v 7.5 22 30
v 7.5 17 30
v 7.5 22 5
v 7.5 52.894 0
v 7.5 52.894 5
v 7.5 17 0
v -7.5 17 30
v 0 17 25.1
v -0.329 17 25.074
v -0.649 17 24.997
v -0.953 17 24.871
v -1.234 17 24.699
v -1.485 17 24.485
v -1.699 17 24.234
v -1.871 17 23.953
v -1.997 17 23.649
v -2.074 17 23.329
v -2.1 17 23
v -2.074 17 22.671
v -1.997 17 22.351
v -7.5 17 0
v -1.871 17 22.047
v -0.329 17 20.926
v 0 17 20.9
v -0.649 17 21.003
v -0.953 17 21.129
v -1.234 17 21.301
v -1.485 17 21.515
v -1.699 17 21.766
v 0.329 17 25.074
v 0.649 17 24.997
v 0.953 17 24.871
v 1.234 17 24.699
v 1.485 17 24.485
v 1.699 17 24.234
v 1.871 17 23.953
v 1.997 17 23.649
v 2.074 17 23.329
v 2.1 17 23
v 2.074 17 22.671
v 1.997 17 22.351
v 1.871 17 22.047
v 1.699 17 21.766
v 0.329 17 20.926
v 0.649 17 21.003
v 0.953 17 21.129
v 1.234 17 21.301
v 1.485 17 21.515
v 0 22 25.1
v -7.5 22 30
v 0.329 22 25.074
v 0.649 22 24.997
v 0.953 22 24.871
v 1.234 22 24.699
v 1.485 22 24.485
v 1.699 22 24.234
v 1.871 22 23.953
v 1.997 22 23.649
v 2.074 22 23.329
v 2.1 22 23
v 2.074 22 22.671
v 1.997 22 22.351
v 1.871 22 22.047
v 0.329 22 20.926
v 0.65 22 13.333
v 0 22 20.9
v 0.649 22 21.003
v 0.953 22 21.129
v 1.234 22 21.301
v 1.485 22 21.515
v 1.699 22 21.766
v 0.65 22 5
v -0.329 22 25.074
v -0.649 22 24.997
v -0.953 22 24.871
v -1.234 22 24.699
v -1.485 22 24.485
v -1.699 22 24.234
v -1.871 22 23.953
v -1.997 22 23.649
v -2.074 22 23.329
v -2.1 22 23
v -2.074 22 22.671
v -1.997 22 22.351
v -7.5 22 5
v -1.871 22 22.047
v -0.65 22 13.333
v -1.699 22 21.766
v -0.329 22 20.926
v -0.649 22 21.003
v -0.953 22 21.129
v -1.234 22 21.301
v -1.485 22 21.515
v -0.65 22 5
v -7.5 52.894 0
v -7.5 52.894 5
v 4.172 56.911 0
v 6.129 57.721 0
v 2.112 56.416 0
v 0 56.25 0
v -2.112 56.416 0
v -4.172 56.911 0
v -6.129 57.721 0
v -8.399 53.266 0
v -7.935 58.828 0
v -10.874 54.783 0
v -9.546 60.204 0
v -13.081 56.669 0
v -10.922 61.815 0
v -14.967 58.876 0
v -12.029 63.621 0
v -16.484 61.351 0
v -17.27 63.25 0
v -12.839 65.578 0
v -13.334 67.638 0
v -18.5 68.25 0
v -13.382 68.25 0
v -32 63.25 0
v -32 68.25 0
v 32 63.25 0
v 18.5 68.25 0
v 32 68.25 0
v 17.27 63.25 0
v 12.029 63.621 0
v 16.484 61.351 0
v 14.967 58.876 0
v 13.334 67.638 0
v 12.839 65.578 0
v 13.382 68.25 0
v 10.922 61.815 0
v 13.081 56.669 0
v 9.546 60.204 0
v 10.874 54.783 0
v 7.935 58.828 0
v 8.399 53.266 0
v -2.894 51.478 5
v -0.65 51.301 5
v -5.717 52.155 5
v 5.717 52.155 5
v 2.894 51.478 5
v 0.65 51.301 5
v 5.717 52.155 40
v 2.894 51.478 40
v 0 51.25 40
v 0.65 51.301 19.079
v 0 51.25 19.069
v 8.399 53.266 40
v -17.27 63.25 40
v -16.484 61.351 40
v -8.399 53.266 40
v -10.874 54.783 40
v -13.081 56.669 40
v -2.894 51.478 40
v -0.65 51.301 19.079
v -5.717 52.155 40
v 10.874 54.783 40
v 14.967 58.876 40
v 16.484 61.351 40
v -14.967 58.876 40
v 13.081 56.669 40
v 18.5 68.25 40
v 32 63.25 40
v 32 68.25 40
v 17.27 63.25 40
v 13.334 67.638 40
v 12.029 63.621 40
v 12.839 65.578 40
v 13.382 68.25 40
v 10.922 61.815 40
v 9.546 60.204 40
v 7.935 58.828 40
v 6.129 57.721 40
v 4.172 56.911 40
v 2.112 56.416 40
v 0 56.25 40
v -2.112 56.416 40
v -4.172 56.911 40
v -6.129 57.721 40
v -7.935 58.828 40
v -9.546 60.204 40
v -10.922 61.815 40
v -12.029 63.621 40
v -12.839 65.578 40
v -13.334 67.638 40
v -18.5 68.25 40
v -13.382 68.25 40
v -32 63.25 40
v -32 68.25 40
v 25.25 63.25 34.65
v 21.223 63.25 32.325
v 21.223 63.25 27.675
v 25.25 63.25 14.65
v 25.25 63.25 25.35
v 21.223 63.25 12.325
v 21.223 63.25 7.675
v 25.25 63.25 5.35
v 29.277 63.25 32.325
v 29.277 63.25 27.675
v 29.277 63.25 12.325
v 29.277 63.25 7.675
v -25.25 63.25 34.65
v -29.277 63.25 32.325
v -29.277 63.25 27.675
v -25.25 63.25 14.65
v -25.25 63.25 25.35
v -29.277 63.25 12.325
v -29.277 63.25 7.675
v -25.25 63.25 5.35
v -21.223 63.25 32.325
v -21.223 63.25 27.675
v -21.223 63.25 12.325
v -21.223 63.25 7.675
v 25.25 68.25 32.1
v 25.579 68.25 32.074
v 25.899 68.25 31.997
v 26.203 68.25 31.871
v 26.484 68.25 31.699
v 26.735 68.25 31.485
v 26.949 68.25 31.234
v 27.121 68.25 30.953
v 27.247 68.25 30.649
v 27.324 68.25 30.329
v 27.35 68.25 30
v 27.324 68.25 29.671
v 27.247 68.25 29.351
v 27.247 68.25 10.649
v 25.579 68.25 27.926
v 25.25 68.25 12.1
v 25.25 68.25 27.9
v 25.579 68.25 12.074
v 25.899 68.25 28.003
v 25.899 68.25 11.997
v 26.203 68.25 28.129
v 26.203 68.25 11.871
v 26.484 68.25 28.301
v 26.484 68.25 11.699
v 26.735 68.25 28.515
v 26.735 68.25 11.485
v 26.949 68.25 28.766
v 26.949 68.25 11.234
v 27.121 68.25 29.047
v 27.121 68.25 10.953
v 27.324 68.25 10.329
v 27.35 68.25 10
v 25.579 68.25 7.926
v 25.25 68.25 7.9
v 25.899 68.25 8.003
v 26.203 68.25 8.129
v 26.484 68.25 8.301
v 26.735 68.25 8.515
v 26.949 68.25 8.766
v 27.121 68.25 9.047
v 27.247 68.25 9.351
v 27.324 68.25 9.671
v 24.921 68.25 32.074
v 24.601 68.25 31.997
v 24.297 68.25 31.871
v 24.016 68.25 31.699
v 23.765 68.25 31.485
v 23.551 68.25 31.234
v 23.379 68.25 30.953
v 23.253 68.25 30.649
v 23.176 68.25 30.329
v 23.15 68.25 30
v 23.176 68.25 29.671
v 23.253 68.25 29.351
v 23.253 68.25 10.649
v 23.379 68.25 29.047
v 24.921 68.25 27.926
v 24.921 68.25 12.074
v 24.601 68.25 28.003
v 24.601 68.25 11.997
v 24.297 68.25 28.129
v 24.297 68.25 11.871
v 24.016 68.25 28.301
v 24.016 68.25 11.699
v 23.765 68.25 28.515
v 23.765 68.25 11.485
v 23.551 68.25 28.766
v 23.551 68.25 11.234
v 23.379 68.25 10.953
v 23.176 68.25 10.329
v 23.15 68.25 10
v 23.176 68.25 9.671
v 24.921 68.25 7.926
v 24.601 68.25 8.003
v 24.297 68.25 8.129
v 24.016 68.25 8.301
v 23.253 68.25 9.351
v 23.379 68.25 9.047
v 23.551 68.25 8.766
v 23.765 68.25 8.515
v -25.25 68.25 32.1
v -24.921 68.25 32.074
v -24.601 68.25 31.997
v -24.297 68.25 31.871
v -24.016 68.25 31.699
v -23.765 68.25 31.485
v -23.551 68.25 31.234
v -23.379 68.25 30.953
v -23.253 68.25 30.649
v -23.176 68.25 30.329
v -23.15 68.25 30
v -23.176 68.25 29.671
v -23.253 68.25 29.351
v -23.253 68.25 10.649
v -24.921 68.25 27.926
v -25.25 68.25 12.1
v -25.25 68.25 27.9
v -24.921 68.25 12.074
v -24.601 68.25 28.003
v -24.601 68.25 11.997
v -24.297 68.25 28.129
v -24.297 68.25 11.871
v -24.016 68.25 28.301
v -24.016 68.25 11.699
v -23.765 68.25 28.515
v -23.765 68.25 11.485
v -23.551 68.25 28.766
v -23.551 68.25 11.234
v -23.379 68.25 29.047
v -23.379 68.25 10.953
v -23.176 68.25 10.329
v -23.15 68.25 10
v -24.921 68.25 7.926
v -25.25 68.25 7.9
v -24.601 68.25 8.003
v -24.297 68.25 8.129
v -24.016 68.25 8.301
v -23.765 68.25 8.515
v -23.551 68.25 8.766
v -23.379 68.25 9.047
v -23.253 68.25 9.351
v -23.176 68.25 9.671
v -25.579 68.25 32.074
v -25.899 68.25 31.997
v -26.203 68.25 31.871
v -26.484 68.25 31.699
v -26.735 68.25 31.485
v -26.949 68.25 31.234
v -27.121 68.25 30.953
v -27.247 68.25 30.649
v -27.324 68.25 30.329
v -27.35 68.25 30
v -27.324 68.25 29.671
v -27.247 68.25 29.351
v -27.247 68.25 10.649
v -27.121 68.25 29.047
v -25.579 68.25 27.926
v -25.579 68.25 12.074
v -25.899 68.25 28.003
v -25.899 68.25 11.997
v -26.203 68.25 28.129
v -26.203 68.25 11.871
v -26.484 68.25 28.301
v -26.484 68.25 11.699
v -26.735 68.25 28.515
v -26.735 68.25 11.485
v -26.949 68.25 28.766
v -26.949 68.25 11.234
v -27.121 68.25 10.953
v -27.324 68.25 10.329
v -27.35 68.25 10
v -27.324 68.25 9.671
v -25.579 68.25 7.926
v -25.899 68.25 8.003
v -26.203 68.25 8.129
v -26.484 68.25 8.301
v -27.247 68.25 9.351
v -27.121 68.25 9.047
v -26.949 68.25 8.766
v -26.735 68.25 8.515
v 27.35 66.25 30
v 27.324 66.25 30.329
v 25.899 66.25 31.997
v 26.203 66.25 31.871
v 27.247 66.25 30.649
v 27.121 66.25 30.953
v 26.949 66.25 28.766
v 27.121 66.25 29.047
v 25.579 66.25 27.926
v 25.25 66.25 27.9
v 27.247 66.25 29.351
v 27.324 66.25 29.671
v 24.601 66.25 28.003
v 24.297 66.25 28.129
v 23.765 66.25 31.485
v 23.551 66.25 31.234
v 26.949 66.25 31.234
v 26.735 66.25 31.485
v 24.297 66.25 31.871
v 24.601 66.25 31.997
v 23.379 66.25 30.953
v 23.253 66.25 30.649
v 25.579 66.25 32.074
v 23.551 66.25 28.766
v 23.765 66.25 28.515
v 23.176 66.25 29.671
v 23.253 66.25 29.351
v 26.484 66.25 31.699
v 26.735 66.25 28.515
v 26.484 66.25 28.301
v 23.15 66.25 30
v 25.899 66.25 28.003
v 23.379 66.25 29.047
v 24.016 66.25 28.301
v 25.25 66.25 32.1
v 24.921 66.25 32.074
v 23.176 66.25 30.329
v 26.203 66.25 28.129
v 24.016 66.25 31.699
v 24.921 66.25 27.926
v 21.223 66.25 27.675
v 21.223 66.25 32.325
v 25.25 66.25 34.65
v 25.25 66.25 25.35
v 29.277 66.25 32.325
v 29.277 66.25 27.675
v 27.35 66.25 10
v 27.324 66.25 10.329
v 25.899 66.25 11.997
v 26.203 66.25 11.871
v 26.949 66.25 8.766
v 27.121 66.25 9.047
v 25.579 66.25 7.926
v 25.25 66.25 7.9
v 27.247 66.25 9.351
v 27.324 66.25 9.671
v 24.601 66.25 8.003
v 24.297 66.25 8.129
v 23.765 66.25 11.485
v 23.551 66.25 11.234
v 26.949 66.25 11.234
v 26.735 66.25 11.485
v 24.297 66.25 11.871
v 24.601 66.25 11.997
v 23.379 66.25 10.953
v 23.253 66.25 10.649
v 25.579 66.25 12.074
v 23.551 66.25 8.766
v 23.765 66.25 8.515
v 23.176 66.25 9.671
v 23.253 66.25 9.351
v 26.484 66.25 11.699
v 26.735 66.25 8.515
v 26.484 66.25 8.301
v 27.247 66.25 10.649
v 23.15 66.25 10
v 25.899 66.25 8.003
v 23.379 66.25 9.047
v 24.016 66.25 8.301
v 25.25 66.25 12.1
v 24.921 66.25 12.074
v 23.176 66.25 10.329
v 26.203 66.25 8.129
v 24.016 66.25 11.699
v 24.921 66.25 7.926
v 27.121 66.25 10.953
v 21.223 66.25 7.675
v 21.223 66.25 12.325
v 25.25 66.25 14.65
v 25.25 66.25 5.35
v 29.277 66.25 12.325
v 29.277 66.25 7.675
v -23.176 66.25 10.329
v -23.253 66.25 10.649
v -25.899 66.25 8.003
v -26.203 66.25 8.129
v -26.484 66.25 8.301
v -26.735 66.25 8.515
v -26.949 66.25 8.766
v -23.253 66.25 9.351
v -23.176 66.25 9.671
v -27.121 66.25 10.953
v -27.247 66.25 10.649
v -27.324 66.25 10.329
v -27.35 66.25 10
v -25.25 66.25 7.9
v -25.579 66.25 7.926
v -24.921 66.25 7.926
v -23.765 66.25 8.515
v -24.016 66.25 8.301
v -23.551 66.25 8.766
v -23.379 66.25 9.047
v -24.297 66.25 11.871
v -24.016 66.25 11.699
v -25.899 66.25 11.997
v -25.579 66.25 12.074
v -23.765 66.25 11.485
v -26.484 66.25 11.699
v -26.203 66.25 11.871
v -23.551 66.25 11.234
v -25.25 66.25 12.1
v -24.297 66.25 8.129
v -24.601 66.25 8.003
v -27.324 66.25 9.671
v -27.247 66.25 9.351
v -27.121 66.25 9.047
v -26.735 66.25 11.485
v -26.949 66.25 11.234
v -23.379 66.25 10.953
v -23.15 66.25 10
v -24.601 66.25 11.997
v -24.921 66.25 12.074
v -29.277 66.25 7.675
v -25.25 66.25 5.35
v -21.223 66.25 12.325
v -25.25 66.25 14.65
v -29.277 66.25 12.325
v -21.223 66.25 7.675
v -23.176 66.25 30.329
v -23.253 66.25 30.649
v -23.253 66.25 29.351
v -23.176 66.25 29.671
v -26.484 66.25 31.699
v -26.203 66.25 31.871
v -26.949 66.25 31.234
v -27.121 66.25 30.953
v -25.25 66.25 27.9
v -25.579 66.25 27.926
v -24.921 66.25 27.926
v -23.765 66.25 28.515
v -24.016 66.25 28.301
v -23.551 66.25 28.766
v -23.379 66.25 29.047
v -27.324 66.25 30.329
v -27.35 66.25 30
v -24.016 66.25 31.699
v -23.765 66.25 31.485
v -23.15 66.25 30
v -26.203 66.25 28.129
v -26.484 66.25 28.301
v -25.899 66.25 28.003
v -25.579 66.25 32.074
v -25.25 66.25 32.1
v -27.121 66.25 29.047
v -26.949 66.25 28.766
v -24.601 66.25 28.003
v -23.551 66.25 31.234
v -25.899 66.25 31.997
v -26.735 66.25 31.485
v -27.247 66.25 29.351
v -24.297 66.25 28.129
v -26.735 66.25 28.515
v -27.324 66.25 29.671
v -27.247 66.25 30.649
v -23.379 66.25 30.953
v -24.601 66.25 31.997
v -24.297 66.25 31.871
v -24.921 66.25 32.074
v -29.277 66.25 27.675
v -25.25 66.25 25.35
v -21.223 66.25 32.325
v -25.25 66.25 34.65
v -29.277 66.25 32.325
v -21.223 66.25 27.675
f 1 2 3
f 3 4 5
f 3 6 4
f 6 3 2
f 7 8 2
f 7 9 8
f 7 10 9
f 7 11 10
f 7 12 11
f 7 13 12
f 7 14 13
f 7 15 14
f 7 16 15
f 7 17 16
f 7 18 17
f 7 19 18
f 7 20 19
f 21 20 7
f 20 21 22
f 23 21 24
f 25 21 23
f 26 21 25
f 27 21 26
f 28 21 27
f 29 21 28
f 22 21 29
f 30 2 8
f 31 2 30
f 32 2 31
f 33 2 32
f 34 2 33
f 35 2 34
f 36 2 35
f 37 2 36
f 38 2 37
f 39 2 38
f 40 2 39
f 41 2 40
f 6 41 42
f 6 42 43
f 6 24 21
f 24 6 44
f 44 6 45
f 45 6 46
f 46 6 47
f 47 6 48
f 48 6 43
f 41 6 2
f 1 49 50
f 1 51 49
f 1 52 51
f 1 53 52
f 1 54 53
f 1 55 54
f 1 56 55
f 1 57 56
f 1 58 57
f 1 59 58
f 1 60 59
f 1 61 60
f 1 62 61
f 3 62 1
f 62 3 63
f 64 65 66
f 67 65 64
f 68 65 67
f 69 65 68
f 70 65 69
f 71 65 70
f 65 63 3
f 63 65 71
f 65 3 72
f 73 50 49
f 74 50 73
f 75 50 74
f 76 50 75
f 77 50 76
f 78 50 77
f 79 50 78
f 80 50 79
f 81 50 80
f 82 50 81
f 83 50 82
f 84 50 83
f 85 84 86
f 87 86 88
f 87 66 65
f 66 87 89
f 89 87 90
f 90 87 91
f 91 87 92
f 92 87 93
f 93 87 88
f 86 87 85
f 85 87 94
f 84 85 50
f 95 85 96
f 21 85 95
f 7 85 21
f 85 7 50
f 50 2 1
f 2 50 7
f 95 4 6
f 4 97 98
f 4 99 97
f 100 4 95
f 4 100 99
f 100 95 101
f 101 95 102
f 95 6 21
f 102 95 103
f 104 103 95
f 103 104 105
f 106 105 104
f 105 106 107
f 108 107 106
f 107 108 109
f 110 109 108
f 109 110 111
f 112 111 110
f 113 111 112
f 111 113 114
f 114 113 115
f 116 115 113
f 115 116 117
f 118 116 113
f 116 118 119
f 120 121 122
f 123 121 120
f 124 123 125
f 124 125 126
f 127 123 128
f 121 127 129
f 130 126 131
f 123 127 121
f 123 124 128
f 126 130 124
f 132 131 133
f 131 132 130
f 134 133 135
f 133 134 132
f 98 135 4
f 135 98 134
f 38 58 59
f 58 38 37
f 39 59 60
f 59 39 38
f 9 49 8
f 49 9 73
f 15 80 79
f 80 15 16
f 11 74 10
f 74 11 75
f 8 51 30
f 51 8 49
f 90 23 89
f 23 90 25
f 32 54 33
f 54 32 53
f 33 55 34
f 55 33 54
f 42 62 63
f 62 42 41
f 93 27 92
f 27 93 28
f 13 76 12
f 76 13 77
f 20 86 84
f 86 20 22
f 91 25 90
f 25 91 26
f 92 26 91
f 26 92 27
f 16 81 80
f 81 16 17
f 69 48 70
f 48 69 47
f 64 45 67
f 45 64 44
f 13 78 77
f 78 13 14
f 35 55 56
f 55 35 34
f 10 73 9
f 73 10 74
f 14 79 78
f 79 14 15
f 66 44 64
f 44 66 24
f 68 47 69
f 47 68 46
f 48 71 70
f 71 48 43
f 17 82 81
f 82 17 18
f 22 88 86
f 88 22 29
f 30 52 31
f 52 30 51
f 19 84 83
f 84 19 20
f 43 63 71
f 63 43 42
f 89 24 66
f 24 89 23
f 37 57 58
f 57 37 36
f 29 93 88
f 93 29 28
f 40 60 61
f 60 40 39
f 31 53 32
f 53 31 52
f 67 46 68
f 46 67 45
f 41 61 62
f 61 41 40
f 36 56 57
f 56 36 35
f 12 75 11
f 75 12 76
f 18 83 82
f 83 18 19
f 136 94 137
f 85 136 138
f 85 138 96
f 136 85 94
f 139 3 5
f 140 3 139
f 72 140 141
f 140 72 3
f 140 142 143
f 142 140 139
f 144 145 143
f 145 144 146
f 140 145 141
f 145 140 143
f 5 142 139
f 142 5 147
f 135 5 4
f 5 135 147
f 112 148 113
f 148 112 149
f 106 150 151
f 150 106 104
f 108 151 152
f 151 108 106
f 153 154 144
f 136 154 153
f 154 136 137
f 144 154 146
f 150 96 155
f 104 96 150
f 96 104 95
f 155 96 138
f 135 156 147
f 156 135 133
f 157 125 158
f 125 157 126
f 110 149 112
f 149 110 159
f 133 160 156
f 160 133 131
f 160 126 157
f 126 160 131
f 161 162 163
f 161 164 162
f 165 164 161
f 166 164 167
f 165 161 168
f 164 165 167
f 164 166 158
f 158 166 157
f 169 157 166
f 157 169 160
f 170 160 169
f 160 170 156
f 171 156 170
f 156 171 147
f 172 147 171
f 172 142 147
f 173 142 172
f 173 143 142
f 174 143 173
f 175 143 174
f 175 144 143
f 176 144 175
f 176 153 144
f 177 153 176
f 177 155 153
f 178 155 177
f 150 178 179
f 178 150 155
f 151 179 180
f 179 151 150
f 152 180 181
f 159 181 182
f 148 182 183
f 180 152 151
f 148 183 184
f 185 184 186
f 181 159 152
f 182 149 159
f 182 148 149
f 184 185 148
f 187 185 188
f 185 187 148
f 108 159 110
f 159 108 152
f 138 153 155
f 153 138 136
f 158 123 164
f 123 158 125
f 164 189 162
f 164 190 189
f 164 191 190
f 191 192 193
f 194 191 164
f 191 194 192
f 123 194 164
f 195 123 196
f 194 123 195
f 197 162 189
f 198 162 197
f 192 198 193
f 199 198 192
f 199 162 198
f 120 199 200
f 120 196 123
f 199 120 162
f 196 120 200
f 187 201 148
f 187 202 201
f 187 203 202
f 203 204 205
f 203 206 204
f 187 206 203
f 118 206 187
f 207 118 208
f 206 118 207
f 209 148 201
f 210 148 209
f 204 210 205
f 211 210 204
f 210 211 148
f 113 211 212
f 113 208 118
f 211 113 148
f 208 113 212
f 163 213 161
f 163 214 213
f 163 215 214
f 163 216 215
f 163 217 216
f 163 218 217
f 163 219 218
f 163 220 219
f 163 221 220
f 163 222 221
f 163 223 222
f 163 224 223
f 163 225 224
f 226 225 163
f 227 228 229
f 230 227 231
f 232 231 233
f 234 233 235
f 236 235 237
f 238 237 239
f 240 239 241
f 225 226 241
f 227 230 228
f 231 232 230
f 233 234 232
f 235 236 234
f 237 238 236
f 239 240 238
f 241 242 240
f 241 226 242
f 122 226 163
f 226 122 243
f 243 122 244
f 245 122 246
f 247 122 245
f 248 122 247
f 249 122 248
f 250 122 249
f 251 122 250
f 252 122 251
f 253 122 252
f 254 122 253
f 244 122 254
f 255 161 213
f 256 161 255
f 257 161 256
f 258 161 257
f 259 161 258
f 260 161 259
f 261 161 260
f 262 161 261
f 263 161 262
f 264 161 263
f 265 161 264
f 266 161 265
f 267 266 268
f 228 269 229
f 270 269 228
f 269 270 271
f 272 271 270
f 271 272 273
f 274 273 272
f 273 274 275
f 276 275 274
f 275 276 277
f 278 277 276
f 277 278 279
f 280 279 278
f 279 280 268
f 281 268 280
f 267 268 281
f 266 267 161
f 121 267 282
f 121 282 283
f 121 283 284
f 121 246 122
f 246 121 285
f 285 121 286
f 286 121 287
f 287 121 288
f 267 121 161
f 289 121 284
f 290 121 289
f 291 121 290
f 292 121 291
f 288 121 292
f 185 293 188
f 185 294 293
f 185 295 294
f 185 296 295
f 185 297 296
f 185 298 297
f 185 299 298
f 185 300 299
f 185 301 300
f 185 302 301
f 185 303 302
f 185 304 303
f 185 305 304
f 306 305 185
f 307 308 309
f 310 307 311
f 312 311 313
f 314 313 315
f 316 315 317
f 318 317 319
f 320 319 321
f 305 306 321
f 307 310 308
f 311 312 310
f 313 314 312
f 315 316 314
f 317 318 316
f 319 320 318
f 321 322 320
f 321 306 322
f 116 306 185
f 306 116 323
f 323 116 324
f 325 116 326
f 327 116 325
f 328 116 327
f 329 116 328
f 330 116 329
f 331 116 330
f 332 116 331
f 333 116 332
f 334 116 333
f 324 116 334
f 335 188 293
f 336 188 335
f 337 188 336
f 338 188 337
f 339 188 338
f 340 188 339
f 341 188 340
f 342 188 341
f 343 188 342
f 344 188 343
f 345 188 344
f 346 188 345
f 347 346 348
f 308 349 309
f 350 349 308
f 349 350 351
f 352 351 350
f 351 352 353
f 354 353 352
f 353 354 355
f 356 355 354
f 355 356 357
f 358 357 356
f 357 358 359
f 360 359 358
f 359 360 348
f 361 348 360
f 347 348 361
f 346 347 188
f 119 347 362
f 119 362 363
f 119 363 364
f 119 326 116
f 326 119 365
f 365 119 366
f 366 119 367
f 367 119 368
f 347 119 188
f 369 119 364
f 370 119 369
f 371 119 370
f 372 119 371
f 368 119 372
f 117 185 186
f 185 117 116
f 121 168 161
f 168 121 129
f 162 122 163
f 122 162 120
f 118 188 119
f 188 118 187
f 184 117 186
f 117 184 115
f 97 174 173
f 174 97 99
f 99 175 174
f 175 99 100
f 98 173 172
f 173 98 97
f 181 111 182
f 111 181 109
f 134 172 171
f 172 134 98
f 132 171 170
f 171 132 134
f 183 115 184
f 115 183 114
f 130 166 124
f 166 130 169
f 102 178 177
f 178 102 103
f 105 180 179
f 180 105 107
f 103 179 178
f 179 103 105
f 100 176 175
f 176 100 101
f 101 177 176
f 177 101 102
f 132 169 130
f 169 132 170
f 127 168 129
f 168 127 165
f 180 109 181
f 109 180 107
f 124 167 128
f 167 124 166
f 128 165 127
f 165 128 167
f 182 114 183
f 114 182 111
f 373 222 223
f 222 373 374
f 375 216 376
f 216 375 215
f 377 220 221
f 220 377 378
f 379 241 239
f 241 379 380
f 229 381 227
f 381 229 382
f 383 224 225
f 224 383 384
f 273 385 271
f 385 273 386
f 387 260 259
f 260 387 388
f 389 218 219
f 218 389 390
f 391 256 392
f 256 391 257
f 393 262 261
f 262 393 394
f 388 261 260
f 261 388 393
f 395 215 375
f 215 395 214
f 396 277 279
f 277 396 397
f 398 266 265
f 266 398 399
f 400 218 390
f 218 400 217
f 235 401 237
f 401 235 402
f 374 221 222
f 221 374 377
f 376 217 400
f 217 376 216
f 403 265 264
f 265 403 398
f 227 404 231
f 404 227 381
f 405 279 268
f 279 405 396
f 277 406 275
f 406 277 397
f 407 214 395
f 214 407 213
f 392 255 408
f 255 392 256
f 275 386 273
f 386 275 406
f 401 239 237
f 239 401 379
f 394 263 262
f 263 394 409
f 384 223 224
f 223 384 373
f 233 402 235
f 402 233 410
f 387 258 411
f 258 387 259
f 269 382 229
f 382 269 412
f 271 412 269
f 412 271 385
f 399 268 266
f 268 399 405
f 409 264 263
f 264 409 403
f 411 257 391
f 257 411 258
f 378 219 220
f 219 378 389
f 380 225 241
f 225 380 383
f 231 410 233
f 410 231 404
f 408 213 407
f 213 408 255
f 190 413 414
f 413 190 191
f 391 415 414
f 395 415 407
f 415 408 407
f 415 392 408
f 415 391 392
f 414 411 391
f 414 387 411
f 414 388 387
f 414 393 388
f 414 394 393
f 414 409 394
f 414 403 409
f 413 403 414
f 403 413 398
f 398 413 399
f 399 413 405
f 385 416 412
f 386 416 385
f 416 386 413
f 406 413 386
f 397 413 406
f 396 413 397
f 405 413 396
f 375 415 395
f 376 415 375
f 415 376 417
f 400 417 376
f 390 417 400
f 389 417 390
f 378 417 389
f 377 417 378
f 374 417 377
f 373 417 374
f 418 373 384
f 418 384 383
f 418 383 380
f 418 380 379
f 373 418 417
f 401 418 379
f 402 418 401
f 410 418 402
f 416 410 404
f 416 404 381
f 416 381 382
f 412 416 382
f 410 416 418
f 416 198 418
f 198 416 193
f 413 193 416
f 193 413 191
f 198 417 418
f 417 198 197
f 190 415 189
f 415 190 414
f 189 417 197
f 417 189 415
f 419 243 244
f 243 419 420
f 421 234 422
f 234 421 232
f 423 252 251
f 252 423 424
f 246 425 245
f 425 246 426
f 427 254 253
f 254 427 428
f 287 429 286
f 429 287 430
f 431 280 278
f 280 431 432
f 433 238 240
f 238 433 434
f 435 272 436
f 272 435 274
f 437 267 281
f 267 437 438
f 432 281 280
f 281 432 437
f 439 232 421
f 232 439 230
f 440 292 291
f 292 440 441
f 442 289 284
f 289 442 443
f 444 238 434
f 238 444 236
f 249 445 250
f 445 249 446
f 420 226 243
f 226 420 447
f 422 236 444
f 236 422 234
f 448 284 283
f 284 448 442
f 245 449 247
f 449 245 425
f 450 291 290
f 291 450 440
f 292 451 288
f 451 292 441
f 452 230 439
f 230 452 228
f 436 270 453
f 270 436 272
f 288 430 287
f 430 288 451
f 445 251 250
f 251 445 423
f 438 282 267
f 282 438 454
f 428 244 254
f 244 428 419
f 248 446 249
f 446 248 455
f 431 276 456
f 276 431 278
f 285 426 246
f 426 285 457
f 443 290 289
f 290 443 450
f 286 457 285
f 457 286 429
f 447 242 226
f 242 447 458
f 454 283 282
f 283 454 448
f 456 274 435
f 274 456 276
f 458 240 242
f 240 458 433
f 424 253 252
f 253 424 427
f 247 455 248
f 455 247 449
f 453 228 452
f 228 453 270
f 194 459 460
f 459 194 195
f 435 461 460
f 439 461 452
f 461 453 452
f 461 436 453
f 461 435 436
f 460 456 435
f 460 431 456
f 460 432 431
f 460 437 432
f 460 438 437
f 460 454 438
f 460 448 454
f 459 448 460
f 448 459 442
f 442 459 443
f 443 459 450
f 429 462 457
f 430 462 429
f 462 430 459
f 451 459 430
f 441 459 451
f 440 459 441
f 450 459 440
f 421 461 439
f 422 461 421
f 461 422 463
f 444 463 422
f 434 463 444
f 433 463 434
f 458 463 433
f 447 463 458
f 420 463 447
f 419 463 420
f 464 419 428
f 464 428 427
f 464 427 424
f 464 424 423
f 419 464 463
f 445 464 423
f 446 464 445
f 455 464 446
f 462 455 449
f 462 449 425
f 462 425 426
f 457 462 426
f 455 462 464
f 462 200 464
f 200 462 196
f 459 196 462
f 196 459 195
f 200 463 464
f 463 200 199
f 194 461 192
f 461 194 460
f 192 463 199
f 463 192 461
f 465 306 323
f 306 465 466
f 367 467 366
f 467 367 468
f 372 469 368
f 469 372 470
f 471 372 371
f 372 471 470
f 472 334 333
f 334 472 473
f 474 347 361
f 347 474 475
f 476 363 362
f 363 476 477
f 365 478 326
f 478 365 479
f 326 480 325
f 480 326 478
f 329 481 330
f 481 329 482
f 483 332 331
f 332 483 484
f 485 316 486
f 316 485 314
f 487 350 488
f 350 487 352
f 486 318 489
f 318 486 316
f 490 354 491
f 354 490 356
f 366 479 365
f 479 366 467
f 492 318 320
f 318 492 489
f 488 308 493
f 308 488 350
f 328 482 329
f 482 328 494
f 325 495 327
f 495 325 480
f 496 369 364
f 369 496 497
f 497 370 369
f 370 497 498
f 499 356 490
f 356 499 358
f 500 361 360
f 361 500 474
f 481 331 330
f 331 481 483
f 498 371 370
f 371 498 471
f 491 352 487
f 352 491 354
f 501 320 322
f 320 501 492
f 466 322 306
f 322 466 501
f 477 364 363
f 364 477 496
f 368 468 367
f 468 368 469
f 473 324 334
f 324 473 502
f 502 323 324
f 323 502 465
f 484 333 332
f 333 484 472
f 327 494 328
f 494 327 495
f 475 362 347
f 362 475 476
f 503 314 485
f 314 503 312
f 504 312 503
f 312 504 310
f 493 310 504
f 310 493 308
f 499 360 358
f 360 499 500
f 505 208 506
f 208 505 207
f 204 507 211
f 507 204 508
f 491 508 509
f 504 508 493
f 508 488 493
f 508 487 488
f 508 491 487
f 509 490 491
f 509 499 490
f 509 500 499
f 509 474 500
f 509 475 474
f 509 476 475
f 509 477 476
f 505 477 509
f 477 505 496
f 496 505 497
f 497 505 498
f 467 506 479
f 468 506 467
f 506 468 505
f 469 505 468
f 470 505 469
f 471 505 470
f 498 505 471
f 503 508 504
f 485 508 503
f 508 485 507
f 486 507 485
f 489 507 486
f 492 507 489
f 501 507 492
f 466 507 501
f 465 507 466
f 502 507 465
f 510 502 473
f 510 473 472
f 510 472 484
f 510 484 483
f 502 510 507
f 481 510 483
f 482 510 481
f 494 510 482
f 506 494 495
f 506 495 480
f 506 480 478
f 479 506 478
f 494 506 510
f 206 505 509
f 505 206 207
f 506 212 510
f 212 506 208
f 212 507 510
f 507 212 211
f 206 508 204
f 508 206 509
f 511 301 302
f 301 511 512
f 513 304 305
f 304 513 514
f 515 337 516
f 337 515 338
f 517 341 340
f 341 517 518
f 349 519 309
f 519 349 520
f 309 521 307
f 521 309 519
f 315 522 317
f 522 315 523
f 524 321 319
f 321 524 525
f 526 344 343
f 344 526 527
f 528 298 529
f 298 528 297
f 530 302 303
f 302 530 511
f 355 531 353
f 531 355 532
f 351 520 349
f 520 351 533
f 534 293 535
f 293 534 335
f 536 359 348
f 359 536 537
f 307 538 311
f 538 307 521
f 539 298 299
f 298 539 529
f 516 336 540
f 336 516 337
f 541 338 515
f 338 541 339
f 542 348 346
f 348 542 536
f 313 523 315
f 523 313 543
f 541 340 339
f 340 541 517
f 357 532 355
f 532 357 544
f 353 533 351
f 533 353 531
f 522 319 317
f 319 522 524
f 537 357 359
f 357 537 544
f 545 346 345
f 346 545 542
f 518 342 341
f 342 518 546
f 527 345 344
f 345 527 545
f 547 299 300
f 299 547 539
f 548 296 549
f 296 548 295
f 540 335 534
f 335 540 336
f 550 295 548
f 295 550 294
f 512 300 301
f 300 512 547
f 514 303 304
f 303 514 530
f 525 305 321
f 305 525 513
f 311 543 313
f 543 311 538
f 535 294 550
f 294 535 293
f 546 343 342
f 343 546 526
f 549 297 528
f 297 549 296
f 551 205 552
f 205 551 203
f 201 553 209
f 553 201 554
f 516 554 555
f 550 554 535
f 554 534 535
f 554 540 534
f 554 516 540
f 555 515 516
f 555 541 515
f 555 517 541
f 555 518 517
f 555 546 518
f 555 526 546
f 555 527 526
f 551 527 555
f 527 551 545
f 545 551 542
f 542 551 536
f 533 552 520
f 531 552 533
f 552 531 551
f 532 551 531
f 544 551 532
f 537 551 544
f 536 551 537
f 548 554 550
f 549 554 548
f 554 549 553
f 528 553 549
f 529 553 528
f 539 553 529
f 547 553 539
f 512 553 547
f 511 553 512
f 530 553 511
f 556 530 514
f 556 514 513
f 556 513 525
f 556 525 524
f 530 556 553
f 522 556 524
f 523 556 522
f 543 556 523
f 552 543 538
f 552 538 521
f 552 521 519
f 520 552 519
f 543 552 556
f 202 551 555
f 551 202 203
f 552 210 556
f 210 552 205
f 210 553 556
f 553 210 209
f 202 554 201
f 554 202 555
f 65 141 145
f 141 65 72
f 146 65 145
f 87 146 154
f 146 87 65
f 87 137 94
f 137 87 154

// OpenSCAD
// file: ../SRC/ISLHOLDER01A_D02.scad
$fn=40; // model faces resolution.
include <../configuration.scad>


//Drzak na sloup - cast bez drzaku anemometru
module ISLHOLDER01A_D02(){
	
difference()
    {
    union()
        {
        //základní válec
        cylinder(h=D02_vyska_uchytky,r=(D02_prumer_obruby+2*D02_sila_materialu)/2,center=true);
		//úchytové plošky		
        translate([D02_dotahova_vzdalenost+D02_sila_materialu/2,0,0]){cube([D02_sila_materialu,D02_delka_celeho_uchytu,D02_vyska_uchytky],center=true);}
		}
    
    //válec na odečet
    cylinder(h=D02_vyska_uchytky+0.01,r=D02_prumer_obruby/2,center=true);     
	        
    //kvádr na odecet
	translate([D02_dotahova_vzdalenost-(D02_prumer_obruby+2*D02_sila_materialu)/2,0,0]){cube([D02_prumer_obruby+2*D02_sila_materialu,D02_prumer_obruby+2*D02_sila_materialu,D02_vyska_uchytky+0.01],center=true);}
		
	//otvory na sroub
	translate([D02_dotahova_vzdalenost,(D02_delka_celeho_uchytu/2-D02_prumer_obruby/2-D02_sila_materialu)/2+D02_prumer_obruby/2+D02_sila_materialu,D02_vyska_uchytky/4]){rotate([0,90,0]){cylinder(h=D02_sila_materialu+0.01,r=D02_prumer_uchytneho_sroubu/2);}}
    
     //drzak matky
    translate([D02_dotahova_vzdalenost+D02_sila_materialu-D02_vyska_matky,(D02_delka_celeho_uchytu/2-D02_prumer_obruby/2-D02_sila_materialu)/2+D02_prumer_obruby/2+D02_sila_materialu,D02_vyska_uchytky/4]){rotate([0,90,0]){ cylinder (h = D02_vyska_matky+0.01, r= (D02_sirka_matky+0.2)/2, $fn=6);}}
   
     
        
    translate([D02_dotahova_vzdalenost,(D02_delka_celeho_uchytu/2-D02_prumer_obruby/2-D02_sila_materialu)/2+D02_prumer_obruby/2+D02_sila_materialu,-D02_vyska_uchytky/4]){rotate([0,90,0]){cylinder(h=D02_sila_materialu+0.01,r=D02_prumer_uchytneho_sroubu/2);}}
    
     //drzak matky
    translate([D02_dotahova_vzdalenost+D02_sila_materialu-D02_vyska_matky,(D02_delka_celeho_uchytu/2-D02_prumer_obruby/2-D02_sila_materialu)/2+D02_prumer_obruby/2+D02_sila_materialu,-D02_vyska_uchytky/4]){rotate([0,90,0]){ cylinder (h = D02_vyska_matky+0.01, r= (D02_sirka_matky+0.2)/2, $fn=6);}}
        
	translate([D02_dotahova_vzdalenost,-((D02_delka_celeho_uchytu/2-D02_prumer_obruby/2-D02_sila_materialu)/2+D02_prumer_obruby/2+D02_sila_materialu),-D02_vyska_uchytky/4]){rotate([0,90,0]){cylinder(h=D02_sila_materialu+0.01,r=D02_prumer_uchytneho_sroubu/2);}}
    
     //drzak matky
    translate([D02_dotahova_vzdalenost+D02_sila_materialu-D02_vyska_matky,-((D02_delka_celeho_uchytu/2-D02_prumer_obruby/2-D02_sila_materialu)/2+D02_prumer_obruby/2+D02_sila_materialu),-D02_vyska_uchytky/4]){rotate([0,90,0]){ cylinder (h = D02_vyska_matky+0.01, r= (D02_sirka_matky+0.2)/2, $fn=6);}}

    translate([D02_dotahova_vzdalenost,-((D02_delka_celeho_uchytu/2-D02_prumer_obruby/2-D02_sila_materialu)/2+D02_prumer_obruby/2+D02_sila_materialu),D02_vyska_uchytky/4]){rotate([0,90,0]){cylinder(h=D02_sila_materialu+0.01,r=D02_prumer_uchytneho_sroubu/2);}}	
    
     //drzak matky
    translate([D02_dotahova_vzdalenost+D02_sila_materialu-D02_vyska_matky,-((D02_delka_celeho_uchytu/2-D02_prumer_obruby/2-D02_sila_materialu)/2+D02_prumer_obruby/2+D02_sila_materialu),D02_vyska_uchytky/4]){rotate([0,90,0]){ cylinder (h = D02_vyska_matky+0.01, r= (D02_sirka_matky+0.2)/2, $fn=6);}}
	
    }
}

module ISLHOLDER01A_D02_2(){
	
difference()
    {
    union()
        {
        //základní válec
        cylinder(h=D02_vyska_uchytky,r=(D02_prumer_obruby+2*D02_sila_materialu)/2,center=true);
		//úchytové plošky		
        translate([D02_dotahova_vzdalenost+D02_sila_materialu/2,0,0]){cube([D02_sila_materialu,D02_delka_celeho_uchytu,D02_vyska_uchytky],center=true);}
		}
    
    //válec na odečet
    cylinder(h=D02_vyska_uchytky+0.01,r=D02_prumer_obruby/2,center=true);     
	        
    //kvádr na odecet
	translate([D02_dotahova_vzdalenost-(D02_prumer_obruby+2*D02_sila_materialu)/2,0,0]){cube([D02_prumer_obruby+2*D02_sila_materialu,D02_prumer_obruby+2*D02_sila_materialu,D02_vyska_uchytky+0.01],center=true);}
		
	//otvory na sroub
	translate([D02_dotahova_vzdalenost,(D02_delka_celeho_uchytu/2-D02_prumer_obruby/2-D02_sila_materialu)/2+D02_prumer_obruby/2+D02_sila_materialu,D02_vyska_uchytky/4]){rotate([0,90,0]){cylinder(h=D02_sila_materialu+0.01,r=D02_prumer_uchytneho_sroubu/2);}}
    
    
   
     
        
    translate([D02_dotahova_vzdalenost,(D02_delka_celeho_uchytu/2-D02_prumer_obruby/2-D02_sila_materialu)/2+D02_prumer_obruby/2+D02_sila_materialu,-D02_vyska_uchytky/4]){rotate([0,90,0]){cylinder(h=D02_sila_materialu+0.01,r=D02_prumer_uchytneho_sroubu/2);}}
    
     
        
	translate([D02_dotahova_vzdalenost,-((D02_delka_celeho_uchytu/2-D02_prumer_obruby/2-D02_sila_materialu)/2+D02_prumer_obruby/2+D02_sila_materialu),-D02_vyska_uchytky/4]){rotate([0,90,0]){cylinder(h=D02_sila_materialu+0.01,r=D02_prumer_uchytneho_sroubu/2);}}
    
    

    translate([D02_dotahova_vzdalenost,-((D02_delka_celeho_uchytu/2-D02_prumer_obruby/2-D02_sila_materialu)/2+D02_prumer_obruby/2+D02_sila_materialu),D02_vyska_uchytky/4]){rotate([0,90,0]){cylinder(h=D02_sila_materialu+0.01,r=D02_prumer_uchytneho_sroubu/2);}}	
    
    
	
    }
}


//ISLHOLDER01A_D02();
// file: ../SRC/ISLHOLDER01A_D01.scad
$fn=40; // model faces resolution.
include <../configuration.scad>

include <ISLHOLDER01A_D02.scad>


PI=3.141592;

//Držák anemometru

module ISLHOLDER01A_D01()
{
difference()
    {
    union()  
        { 
        //výstuha
            translate([S01_sila_materialu/2,0,0])
        rotate ([0,-90,0])
            linear_extrude (height = S01_sila_materialu, convexity = 10)
                polygon(points=[[D02_vyska_uchytky/2,D01_delka_tyce+S01_prumer_vnitrni/2+D01_material_pred_zavitem+D02_sila_materialu-1],[0, D01_delka_tyce+S01_prumer_vnitrni/2+D01_material_pred_zavitem+D02_sila_materialu-1],[0,S01_prumer_vnitrni/2+D01_material_pred_zavitem],[D02_vyska_uchytky/3,S01_prumer_vnitrni/2+D01_material_pred_zavitem]]);   
  
         rotate ([90,0,0])     
translate([0,15,D01_material_pod_zavitem/2-S01_prumer_vnitrni/2-D01_material_pred_zavitem])
         difference() {   
  cube([D01_sirka_tyce,30,D01_material_pod_zavitem],center=true); 
translate([0,8,0])
cylinder(h=D01_material_pod_zavitem+0.01,r=D02_prumer_uchytneho_sroubu/2,center=true); 
}

        //uchyt na tyc
        translate([0,D01_delka_tyce/2+(S01_prumer_vnitrni-S01_tolerance_zavit)/2+D01_material_pred_zavitem,D01_material_pod_zavitem/2])
            cube([D01_sirka_tyce,D01_delka_tyce,D01_material_pod_zavitem],center=true); 
  
        //uchyt na tyc ovalna cast
        translate([0,(S01_prumer_vnitrni-S01_tolerance_zavit)/2+D01_material_pred_zavitem,D01_material_pod_zavitem/2])
            cube([D01_sirka_tyce,D01_material_za_zavitem+D01_material_pred_zavitem,D01_material_pod_zavitem],center=true);
      
        //material kolem uchytu na sloupek
        translate([0,D01_delka_tyce+(S01_prumer_vnitrni-S01_tolerance_zavit)/2+D01_material_pred_zavitem+(D02_sila_materialu+D02_prumer_obruby/2)/2-D02_dotahova_vzdalenost,D01_material_pod_zavitem/2])

        difference()
            {
            cube([D01_sirka_tyce,D02_sila_materialu+D02_prumer_obruby/2,D01_material_pod_zavitem],center=true);
            
            translate([0,D02_prumer_obruby/2-D02_dotahova_vzdalenost-D02_sila_materialu,0])    
                cylinder(h=D02_vyska_uchytky+0.01,r=D02_prumer_obruby/2,center=true);         
            }        
      
        //uchyt na sloupek
        translate([0,D01_delka_tyce+(S01_prumer_vnitrni-S01_tolerance_zavit)/2+D01_material_pred_zavitem+D02_sila_materialu+(D02_prumer_obruby)/2,D02_vyska_uchytky/2])
            rotate(a=[0,0,270])
                ISLHOLDER01A_D02();      

        }

    

    }
}
 
ISLHOLDER01A_D01();
 
// file: ../configuration.scad
$fn=40; // model faces resolution.

//Parametry pro D01 a D02
//nastavení držáku na sloup
//Parametry pro D5
//----------------------------------------------------------------
//----------------------------------------------------------------


S01_sila_materialu=1.3; //sila výztuhy

//D01 - uchyt velky
D01_material_pod_zavitem=5;
D01_material_za_zavitem=3;
D01_material_pred_zavitem=2;
D01_delka_tyce=30;
D01_sirka_tyce=15;

//D02 - uchyt na sloup
D02_sila_materialu=5;
D02_vyska_uchytky=40;
D02_prumer_obruby=27; 
//27mm - 3/4 trubka
D02_delka_celeho_uchytu=64;
D02_dotahova_vzdalenost=1.5;
D02_prumer_uchytneho_sroubu=4.2;
D02_sirka_matky=9.1; //pro M4
D02_vyska_matky=3;


D05_vyska_drzaku_senzoru=15;
D05_prumer_zkumavky_vnitrni=21.4;
D05_vyska_podstavce=10;
D05_sirka_otvoru_na_kabel=5;




//není potřeba měnit
S01_prumer_vnitrni=40;
S01_tolerance_zavit=1.5;
// main file
$fn=100; // model faces resolution.
include <../configuration.scad>



use <../SRC/ISLHOLDER01A_D01.scad>


PI=3.141592;
 
ISLHOLDER01A_D01();


    
  
